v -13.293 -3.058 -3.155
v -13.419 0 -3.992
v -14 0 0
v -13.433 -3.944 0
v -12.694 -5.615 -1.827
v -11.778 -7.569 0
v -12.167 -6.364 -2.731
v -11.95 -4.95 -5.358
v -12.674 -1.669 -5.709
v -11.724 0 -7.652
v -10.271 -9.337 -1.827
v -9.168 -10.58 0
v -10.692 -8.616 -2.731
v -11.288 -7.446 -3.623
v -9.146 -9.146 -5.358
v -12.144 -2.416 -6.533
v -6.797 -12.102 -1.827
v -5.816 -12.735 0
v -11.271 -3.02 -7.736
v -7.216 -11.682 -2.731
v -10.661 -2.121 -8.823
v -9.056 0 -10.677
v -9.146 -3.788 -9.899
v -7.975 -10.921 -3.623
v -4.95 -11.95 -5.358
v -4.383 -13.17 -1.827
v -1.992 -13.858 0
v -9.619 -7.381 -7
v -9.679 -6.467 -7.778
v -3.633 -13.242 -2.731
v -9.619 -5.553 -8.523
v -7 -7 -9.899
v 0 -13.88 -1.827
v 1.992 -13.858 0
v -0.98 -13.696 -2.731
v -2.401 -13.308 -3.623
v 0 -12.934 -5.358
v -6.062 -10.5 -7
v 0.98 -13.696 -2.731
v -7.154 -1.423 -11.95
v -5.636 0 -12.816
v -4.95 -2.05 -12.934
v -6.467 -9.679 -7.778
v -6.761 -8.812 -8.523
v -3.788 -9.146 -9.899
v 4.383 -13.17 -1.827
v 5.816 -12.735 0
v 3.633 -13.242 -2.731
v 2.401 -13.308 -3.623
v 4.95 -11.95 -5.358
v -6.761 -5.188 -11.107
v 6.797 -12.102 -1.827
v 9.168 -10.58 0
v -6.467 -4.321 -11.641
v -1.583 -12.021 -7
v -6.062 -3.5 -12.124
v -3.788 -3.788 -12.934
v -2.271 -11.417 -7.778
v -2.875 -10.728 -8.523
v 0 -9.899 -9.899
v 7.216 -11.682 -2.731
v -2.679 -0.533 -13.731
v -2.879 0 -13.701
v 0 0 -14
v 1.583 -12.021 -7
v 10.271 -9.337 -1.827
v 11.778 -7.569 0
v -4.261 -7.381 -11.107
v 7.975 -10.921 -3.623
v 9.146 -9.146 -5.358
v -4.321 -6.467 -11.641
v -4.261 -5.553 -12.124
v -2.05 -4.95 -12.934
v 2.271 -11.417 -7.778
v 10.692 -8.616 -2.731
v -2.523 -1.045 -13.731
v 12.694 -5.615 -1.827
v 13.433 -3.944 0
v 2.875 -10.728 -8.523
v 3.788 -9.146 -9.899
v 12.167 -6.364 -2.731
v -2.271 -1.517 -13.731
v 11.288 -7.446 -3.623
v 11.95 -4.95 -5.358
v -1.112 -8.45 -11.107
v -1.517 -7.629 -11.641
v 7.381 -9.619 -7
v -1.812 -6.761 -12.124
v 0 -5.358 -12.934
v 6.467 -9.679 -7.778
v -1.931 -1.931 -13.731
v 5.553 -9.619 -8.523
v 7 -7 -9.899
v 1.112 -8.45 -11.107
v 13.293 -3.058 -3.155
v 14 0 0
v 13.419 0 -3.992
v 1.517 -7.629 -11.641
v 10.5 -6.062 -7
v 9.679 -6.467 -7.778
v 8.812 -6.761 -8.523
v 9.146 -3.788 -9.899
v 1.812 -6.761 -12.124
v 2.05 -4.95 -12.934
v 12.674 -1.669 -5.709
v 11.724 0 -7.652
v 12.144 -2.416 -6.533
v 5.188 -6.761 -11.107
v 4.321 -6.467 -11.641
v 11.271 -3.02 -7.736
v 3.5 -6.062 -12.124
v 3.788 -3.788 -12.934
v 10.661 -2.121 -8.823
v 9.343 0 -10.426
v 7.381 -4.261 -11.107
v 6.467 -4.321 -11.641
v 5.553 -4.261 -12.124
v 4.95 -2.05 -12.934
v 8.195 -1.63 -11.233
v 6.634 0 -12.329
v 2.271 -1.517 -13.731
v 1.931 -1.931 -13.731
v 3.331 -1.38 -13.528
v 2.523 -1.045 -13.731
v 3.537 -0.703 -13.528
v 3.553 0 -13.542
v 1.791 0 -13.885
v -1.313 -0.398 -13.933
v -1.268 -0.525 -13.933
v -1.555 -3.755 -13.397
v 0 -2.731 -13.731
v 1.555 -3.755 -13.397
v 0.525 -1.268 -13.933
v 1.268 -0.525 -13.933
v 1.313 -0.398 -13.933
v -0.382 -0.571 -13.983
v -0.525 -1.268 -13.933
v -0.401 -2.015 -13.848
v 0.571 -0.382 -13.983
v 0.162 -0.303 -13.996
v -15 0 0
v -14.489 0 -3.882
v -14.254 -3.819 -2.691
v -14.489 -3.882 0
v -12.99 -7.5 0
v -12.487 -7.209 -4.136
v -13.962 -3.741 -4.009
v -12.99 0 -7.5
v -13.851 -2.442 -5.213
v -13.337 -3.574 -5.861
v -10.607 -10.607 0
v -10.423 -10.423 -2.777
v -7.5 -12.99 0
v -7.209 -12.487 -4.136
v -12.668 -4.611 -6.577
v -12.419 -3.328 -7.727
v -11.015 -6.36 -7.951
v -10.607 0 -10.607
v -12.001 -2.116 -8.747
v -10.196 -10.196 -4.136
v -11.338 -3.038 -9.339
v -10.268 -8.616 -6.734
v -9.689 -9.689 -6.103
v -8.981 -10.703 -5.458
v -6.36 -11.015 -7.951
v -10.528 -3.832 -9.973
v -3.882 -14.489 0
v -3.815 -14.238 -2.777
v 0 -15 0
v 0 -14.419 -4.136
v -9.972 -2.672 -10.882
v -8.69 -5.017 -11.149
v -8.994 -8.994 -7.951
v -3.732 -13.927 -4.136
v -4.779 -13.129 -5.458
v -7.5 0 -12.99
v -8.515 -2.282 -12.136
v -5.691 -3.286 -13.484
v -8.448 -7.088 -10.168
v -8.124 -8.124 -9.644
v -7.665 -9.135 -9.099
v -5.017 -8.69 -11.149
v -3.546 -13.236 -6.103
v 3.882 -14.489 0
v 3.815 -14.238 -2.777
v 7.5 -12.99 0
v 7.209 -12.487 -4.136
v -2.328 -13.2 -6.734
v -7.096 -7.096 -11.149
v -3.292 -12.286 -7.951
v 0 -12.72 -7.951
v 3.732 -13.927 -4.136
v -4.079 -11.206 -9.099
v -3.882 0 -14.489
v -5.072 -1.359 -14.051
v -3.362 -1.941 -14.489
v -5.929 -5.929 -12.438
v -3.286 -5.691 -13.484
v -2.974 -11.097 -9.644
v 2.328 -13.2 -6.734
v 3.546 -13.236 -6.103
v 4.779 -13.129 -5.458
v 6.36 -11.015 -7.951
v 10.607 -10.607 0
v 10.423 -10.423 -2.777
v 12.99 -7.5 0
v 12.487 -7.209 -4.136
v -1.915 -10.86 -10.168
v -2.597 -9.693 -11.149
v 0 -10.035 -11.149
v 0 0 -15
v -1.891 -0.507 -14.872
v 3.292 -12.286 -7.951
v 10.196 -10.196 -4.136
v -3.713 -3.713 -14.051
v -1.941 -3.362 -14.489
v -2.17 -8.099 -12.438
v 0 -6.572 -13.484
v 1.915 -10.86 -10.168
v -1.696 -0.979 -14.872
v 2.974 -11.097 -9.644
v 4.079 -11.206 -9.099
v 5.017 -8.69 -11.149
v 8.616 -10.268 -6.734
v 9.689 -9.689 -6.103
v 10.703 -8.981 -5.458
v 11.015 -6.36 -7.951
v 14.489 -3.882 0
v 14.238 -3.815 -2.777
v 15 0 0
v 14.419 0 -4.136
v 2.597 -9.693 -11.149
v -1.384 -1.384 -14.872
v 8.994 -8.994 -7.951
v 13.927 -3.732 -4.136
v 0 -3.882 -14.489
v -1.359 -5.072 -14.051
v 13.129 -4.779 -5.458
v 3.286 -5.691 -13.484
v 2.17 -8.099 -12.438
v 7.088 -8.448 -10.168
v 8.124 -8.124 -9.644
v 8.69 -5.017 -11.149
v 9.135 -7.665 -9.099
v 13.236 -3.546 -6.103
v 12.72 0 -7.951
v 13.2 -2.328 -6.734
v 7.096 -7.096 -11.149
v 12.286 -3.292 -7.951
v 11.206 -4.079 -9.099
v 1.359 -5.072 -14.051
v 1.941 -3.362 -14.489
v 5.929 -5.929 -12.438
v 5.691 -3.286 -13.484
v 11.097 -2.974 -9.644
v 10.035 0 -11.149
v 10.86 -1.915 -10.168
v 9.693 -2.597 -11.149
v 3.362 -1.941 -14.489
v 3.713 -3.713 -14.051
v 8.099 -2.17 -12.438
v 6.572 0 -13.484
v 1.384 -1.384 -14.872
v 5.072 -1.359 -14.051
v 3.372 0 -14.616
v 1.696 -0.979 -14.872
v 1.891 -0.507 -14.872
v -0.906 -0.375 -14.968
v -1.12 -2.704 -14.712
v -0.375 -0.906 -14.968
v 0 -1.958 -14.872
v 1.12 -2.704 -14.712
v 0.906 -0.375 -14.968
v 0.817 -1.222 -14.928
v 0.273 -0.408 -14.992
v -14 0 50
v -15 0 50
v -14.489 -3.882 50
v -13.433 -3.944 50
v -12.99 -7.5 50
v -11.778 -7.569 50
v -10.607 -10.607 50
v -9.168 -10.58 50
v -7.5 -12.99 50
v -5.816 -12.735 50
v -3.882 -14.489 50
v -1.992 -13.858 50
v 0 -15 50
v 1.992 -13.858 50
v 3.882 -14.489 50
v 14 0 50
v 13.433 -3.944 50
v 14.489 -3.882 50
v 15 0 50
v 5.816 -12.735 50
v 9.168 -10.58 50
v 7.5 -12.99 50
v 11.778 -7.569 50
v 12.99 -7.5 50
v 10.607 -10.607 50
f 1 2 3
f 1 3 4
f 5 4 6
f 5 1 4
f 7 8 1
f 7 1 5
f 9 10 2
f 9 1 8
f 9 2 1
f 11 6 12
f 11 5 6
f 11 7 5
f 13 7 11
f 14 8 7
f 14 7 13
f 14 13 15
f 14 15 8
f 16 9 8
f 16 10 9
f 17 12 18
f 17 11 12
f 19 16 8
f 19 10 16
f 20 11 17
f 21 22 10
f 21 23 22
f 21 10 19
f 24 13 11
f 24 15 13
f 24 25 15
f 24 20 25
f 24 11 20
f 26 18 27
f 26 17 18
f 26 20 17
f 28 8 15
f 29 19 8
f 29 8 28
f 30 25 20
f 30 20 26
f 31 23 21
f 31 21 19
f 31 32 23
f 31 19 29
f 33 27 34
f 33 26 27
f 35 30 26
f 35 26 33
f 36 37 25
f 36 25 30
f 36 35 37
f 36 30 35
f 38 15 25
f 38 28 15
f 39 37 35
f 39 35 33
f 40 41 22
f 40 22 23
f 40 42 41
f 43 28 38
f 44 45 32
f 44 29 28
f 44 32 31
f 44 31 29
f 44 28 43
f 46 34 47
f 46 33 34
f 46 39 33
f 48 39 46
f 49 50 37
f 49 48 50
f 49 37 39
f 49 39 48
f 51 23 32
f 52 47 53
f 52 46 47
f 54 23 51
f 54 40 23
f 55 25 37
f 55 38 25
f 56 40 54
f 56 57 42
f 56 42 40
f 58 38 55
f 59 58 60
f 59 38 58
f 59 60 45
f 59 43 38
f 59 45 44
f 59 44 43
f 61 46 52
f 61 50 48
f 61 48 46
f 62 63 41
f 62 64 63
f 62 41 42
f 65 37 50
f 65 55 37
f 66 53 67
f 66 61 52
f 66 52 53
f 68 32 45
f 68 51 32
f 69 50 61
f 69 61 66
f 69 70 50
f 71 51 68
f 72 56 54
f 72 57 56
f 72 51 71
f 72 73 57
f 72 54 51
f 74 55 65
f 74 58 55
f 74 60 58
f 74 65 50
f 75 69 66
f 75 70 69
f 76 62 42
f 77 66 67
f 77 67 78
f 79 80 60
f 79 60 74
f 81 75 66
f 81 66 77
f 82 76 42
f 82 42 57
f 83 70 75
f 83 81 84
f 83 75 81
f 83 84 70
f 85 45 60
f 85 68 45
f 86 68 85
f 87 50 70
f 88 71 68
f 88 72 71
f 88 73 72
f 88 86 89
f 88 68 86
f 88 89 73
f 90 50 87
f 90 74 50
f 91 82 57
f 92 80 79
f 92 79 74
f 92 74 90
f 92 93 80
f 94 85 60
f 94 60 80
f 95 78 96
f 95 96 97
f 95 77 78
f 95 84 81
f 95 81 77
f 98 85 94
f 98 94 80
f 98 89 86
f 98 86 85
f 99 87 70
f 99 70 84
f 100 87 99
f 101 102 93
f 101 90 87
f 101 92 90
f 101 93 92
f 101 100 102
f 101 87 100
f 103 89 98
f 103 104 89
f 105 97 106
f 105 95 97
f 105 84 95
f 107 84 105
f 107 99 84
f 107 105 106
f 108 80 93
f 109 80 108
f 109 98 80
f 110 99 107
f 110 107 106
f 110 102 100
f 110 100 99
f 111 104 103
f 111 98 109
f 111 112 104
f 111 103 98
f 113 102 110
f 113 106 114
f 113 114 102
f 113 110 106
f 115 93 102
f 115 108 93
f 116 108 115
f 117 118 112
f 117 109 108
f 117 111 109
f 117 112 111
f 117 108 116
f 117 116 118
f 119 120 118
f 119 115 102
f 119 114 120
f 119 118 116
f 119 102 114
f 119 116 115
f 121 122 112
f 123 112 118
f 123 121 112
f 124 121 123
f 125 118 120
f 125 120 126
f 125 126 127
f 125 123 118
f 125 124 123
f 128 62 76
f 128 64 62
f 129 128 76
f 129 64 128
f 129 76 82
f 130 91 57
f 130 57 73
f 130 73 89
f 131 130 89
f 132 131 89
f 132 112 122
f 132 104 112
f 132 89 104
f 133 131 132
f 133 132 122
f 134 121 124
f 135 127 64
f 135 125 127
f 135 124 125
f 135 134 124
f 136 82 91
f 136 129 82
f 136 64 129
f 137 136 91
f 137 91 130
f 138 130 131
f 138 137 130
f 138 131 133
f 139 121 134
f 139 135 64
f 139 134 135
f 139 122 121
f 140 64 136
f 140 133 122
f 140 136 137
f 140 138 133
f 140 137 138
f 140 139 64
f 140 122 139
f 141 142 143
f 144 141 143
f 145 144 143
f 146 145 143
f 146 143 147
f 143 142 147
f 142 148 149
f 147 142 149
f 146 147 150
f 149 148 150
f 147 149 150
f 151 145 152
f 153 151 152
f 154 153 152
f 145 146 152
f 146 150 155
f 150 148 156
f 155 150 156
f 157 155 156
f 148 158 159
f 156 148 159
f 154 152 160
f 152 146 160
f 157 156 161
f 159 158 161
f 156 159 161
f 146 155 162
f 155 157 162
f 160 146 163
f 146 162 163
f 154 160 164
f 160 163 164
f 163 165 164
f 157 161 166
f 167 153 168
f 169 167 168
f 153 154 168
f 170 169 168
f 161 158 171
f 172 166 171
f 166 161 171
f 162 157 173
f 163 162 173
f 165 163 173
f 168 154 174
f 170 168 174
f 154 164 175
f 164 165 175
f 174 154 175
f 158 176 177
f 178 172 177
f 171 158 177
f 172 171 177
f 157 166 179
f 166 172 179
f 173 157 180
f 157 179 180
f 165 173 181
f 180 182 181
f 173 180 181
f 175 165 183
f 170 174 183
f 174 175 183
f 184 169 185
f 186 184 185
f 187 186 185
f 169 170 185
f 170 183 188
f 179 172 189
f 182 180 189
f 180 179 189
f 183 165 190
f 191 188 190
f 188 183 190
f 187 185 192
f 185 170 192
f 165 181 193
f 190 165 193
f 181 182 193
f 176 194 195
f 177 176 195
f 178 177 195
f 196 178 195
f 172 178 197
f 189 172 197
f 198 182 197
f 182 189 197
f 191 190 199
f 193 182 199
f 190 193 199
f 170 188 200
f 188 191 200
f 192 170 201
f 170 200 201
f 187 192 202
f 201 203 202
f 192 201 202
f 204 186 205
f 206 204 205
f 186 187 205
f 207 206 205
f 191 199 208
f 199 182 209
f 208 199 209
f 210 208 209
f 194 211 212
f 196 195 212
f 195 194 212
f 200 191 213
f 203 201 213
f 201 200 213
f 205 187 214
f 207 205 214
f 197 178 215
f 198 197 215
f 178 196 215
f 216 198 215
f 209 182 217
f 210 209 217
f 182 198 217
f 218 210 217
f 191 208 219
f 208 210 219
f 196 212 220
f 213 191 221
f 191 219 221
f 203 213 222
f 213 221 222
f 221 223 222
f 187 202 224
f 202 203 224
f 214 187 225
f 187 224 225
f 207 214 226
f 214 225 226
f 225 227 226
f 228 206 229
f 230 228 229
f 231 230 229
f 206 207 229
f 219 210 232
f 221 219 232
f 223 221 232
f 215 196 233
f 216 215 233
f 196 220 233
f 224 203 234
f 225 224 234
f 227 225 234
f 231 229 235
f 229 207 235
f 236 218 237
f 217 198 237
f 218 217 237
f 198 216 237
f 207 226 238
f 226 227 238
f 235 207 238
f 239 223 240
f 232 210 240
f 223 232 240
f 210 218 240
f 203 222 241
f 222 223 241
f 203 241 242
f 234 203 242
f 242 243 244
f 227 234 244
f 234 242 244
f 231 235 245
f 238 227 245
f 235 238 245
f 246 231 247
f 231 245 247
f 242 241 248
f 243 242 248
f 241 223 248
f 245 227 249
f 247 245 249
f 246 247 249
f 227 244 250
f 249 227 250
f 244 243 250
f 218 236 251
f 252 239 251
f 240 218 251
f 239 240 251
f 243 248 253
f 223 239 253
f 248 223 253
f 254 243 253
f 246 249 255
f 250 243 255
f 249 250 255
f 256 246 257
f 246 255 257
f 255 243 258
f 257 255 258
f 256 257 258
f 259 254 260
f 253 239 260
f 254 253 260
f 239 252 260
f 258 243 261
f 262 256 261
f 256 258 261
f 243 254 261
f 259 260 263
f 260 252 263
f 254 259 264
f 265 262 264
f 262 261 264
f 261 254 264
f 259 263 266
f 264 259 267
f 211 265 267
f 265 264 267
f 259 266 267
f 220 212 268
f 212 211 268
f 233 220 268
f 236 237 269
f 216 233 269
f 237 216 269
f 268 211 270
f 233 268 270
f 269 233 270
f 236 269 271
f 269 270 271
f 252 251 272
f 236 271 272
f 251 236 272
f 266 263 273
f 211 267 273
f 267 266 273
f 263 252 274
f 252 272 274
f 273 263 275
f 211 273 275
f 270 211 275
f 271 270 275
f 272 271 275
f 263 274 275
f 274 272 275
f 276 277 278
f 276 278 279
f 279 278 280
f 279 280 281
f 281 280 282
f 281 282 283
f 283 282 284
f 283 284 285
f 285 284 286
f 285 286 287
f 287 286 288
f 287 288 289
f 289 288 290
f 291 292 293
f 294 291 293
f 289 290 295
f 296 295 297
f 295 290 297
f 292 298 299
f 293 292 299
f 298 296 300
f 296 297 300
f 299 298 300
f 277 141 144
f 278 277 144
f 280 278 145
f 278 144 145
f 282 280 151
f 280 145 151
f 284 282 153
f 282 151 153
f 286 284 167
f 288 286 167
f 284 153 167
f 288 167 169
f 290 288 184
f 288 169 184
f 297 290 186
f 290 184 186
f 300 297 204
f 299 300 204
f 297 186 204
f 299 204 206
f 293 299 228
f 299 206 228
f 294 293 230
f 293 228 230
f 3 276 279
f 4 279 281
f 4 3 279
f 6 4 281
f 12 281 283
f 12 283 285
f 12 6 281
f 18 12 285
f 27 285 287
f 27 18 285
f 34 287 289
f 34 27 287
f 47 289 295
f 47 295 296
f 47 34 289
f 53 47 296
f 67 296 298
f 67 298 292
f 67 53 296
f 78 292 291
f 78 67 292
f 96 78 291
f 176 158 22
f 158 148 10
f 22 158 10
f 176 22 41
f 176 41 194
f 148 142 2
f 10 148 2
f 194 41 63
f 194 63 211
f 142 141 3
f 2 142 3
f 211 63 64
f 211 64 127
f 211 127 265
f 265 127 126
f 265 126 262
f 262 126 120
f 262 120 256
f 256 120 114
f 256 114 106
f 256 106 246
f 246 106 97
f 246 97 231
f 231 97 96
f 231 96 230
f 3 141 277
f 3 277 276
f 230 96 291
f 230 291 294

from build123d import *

# Parameters (mm, degrees)
F4_DEPTH = 65.001
F5_T     = -1


with BuildPart() as f1:
    # F0 (on Front) → F1 (revolve)
    with BuildSketch(Plane.XZ):
        with BuildLine():
            Line((-15, 50), (-15, 0))
            ThreePointArc((-15, 0), (-10.606602, -10.606602), (0, -15))
            Line((0, -15), (0, 50))
            Line((0, 50), (-15, 50))
        make_face()
    revolve(axis=Axis((0, 0, 17.5), (0, 0, 1)))

    # F3 (on offset) → F4 (cut, through all)
    with BuildSketch(Plane.XY.offset(50)):
        with BuildLine():
            Line((-15, 0), (15, 0))
            ThreePointArc((15, 0), (0, 15), (-15, 0))
        make_face()
    extrude(amount=-F4_DEPTH, mode=Mode.SUBTRACT)

    # F5
    f5_openings = [f1.faces().sort_by_distance(p)[0] for p in [
        (0, 0, 19.018801),
        (0, -6.366198, 50),
    ]]
    offset(amount=F5_T, openings=f5_openings)


solid = f1.part
